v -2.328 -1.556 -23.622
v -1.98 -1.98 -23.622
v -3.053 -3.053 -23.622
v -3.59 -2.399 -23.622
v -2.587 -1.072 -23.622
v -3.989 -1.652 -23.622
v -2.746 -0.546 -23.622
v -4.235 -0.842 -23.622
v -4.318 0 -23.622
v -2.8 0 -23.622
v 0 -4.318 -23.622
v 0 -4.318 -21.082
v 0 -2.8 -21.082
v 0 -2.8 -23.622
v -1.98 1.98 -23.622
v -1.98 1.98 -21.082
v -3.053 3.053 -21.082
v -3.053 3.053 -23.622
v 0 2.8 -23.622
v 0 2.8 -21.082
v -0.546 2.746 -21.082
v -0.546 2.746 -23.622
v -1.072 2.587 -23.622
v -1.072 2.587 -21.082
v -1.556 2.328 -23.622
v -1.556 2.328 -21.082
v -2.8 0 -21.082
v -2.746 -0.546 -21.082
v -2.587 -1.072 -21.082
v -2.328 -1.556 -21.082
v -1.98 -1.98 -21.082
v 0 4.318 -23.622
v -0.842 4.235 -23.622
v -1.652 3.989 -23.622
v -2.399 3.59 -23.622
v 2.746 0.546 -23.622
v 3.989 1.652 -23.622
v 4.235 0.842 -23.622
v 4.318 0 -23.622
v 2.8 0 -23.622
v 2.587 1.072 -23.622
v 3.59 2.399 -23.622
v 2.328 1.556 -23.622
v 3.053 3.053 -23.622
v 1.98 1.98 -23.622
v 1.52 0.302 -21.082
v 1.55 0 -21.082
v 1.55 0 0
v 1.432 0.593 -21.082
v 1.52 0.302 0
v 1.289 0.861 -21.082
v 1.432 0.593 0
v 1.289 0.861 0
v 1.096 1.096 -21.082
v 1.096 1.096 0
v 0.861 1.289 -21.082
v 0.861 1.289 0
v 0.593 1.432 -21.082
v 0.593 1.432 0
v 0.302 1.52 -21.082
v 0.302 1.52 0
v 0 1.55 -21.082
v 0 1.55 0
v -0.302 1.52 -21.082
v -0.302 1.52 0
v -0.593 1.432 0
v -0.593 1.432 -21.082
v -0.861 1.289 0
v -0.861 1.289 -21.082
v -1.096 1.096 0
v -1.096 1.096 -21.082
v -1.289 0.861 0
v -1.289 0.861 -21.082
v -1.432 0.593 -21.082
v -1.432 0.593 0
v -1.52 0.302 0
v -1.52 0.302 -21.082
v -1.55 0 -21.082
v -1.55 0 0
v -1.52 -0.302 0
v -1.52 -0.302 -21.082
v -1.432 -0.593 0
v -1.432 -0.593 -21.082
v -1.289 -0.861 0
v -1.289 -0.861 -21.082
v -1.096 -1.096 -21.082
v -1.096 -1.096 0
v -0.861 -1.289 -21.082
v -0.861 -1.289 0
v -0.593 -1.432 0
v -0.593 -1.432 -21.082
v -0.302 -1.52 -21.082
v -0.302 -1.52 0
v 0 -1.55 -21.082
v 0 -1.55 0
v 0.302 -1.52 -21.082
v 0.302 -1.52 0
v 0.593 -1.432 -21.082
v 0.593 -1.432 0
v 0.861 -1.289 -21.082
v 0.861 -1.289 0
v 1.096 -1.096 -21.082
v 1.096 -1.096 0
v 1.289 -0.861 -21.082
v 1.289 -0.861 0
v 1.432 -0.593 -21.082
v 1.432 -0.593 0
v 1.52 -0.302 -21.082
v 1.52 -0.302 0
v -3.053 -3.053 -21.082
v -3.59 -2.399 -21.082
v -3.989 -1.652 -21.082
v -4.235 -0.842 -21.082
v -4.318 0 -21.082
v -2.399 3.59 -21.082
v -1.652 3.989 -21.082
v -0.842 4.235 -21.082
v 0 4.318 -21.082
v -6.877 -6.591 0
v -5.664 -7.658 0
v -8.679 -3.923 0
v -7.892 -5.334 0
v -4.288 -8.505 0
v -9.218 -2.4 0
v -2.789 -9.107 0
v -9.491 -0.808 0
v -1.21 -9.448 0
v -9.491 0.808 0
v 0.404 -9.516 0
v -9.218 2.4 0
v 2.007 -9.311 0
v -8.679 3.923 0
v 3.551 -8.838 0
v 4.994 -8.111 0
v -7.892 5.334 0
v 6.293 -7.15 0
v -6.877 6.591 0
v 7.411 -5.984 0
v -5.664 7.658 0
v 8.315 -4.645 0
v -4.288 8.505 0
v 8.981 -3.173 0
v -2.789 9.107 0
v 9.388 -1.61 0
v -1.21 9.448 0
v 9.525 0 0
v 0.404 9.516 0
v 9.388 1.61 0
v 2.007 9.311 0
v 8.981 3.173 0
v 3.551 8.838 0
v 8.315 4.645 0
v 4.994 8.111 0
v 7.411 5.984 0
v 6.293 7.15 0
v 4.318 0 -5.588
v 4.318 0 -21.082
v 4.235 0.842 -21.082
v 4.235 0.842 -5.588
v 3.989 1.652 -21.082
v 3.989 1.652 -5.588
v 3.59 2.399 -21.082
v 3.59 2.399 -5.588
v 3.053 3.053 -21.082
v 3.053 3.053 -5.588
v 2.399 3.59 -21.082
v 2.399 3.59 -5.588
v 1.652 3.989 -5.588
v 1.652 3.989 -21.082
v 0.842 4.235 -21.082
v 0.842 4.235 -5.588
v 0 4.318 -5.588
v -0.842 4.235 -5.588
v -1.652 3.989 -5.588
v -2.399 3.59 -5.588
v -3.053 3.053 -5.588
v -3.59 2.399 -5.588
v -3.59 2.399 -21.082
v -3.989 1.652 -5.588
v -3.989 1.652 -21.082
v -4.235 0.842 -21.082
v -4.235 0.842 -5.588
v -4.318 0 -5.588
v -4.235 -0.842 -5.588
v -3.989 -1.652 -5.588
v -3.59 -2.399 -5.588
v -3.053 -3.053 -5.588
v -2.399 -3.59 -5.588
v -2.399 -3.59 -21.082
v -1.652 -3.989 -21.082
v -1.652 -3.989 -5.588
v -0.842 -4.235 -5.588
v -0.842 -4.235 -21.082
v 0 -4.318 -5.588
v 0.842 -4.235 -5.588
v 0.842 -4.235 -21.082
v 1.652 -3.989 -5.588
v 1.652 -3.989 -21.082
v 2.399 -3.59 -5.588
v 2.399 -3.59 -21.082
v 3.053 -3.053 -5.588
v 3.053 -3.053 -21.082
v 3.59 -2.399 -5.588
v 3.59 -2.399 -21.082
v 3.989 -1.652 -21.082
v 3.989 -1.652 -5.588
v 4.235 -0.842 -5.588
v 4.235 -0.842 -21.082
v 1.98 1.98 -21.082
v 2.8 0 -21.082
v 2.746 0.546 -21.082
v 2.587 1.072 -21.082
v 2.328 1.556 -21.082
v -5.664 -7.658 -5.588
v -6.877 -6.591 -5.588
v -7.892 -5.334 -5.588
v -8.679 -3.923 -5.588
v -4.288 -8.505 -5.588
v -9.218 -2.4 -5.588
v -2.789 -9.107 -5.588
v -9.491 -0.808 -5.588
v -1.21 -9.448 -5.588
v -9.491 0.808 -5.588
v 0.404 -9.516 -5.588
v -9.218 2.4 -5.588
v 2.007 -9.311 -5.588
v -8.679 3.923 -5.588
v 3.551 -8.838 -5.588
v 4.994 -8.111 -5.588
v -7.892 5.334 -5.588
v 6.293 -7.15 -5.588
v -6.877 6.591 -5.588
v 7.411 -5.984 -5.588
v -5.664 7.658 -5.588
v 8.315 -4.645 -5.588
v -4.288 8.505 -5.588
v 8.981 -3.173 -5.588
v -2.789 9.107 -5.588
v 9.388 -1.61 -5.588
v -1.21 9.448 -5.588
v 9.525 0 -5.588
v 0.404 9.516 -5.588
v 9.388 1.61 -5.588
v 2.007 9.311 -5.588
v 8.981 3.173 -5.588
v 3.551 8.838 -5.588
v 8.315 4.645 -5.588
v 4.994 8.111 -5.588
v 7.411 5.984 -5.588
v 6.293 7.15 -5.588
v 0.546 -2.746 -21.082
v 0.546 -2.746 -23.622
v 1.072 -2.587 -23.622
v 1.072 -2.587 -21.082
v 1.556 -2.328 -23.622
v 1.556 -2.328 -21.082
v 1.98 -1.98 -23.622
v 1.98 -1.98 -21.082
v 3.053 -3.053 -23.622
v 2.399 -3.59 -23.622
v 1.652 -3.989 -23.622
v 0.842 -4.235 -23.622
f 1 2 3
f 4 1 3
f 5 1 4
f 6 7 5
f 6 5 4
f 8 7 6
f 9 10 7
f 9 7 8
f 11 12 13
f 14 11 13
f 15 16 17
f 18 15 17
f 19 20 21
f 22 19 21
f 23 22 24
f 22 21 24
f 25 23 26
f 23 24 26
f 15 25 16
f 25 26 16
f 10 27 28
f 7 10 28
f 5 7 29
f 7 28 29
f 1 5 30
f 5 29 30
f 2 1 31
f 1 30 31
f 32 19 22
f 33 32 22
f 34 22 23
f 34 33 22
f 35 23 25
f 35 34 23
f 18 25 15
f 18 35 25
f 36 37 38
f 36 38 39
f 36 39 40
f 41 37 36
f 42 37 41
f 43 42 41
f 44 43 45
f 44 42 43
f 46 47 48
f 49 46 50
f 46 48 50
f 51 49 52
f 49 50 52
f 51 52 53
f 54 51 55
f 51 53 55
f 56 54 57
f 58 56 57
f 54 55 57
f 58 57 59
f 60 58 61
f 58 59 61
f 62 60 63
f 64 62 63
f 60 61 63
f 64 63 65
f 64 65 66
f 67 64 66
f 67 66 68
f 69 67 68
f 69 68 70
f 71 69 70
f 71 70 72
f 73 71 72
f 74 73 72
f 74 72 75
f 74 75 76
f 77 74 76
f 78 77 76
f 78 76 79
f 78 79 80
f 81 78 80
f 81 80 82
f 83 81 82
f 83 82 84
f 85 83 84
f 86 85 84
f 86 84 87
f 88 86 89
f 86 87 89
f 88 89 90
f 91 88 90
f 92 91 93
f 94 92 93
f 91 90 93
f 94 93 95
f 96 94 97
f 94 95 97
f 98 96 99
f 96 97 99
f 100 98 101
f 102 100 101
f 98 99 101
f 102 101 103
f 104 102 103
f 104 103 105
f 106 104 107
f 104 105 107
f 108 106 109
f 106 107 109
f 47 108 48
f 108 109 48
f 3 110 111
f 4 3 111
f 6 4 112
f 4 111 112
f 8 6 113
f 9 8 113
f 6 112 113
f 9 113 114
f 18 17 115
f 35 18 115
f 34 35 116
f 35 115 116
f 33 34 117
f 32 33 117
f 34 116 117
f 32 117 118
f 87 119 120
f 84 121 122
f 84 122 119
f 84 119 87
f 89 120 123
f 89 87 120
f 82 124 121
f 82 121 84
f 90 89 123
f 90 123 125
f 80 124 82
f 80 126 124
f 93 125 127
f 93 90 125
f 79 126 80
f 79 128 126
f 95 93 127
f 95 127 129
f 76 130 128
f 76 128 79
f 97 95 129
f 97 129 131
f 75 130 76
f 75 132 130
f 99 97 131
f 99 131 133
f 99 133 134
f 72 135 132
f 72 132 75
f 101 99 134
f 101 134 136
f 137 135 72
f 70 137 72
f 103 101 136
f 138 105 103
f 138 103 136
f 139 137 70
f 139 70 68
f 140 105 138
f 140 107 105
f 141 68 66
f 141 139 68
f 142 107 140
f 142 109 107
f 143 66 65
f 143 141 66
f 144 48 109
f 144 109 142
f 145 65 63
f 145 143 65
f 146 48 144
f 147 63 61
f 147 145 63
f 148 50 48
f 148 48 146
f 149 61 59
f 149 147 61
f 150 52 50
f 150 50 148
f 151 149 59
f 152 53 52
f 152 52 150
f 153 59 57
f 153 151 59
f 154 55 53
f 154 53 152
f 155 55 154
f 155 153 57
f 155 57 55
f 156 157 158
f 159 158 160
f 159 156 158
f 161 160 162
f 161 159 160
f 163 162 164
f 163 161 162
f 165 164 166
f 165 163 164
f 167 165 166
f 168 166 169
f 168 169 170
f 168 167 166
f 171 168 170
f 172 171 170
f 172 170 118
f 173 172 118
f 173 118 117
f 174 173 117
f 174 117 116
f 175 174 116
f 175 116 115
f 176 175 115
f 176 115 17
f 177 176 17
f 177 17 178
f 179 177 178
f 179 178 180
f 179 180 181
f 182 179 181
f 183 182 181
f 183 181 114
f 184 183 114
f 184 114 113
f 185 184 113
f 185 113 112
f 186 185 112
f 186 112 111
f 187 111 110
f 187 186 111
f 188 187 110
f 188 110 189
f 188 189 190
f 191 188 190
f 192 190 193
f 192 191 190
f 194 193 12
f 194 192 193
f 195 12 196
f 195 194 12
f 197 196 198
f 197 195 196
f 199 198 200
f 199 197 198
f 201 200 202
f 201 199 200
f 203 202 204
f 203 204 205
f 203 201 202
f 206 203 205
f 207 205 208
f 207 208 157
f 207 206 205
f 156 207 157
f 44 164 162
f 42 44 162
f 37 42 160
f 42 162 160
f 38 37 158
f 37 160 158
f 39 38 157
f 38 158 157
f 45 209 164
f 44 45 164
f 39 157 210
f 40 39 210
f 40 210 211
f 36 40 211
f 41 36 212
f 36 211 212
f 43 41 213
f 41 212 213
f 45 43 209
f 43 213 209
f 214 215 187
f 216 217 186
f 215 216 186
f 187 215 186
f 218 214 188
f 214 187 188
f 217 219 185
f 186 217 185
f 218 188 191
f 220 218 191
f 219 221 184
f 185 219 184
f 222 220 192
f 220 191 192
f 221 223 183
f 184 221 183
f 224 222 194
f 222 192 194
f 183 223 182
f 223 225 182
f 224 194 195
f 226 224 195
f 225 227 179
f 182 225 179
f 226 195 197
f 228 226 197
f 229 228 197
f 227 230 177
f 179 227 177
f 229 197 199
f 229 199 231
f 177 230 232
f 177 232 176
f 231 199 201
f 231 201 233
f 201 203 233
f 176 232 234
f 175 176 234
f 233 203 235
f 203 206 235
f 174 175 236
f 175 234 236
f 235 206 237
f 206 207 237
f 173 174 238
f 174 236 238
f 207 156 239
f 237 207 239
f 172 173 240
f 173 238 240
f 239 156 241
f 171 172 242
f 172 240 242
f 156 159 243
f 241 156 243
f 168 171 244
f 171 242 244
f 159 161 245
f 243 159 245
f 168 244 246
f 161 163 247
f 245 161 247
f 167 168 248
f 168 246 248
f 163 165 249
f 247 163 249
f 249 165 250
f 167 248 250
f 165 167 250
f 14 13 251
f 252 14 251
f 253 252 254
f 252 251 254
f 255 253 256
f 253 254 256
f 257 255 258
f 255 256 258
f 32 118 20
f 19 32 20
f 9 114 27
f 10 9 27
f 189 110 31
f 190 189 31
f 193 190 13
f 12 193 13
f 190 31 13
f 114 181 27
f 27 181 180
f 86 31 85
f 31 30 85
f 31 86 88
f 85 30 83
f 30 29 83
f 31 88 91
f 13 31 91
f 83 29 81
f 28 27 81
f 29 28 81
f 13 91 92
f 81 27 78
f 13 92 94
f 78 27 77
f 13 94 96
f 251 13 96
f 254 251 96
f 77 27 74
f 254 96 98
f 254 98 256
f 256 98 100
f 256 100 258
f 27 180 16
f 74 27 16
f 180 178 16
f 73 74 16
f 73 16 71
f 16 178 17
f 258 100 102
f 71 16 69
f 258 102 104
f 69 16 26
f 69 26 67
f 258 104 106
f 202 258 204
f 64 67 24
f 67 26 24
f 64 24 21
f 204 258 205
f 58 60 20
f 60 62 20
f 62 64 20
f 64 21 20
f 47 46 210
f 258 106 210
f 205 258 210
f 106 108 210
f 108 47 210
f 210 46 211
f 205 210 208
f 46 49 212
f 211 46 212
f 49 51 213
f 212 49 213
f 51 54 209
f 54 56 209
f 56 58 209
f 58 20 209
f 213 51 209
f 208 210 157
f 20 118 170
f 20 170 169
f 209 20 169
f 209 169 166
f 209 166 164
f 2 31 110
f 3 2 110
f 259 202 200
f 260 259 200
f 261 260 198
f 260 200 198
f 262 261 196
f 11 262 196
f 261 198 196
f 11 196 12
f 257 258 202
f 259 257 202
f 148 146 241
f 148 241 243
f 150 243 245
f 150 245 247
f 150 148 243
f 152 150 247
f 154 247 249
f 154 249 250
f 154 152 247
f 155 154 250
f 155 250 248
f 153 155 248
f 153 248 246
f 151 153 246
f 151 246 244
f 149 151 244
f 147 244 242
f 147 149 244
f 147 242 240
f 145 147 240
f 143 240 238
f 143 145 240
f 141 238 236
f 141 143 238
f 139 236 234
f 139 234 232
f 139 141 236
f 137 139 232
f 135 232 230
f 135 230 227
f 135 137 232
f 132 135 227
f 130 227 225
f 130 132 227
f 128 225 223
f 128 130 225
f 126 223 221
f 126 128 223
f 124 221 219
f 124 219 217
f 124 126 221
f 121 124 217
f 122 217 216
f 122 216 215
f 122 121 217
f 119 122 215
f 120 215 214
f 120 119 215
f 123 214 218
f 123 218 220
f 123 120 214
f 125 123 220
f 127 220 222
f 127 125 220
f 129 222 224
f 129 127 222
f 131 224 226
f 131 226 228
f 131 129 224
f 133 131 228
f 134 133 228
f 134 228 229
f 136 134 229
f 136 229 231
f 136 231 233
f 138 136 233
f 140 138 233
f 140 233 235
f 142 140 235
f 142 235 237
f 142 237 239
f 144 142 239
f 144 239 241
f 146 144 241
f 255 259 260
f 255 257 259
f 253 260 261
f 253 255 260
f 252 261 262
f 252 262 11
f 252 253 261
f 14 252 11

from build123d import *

# Parameters (mm, degrees)
SKETCH1_R           = 4.318
BOSS_EXTRUDE1_DEPTH = 21.082
SKETCH2_R           = 9.525
BOSS_EXTRUDE2_DEPTH = 5.588
BOSS_EXTRUDE3_DEPTH = 2.54
SKETCH6_R           = 1.55
CUT_EXTRUDE1_DEPTH  = 24.622


with BuildPart() as part:
    # Sketch1 → Boss-Extrude1 (new body)
    with BuildSketch(Plane.XY):
        Circle(SKETCH1_R)
    extrude(amount=-BOSS_EXTRUDE1_DEPTH)

    # Sketch2 → Boss-Extrude2 (add)
    with BuildSketch(Plane.XY):
        Circle(SKETCH2_R)
    extrude(amount=-BOSS_EXTRUDE2_DEPTH)

    # Sketch3 → Boss-Extrude3 (add)
    with BuildSketch(Plane(origin=(0, 0, -21.082), x_dir=(-1, 0, 0), z_dir=(0, 0, -1))):
        with BuildLine():
            Line((1.979898987, -1.979898987), (3.053287081, -3.053287081))
            ThreePointArc((3.053287081, -3.053287081), (3.989311821, -1.652427061), (4.318, 0))
            Line((4.318, 0), (2.8, 0))
            ThreePointArc((2.8, 0), (2.586862691, -1.071513611), (1.979898987, -1.979898987))
        make_face()
        with BuildLine():
            ThreePointArc((-3.053287081, 3.053287081), (-3.989311821, 1.652427061), (-4.318, 0))
            Line((-4.318, 0), (-2.8, 0))
            ThreePointArc((-2.8, 0), (-2.586862691, 1.071513611), (-1.979898987, 1.979898987))
            Line((-1.979898987, 1.979898987), (-3.053287081, 3.053287081))
        make_face()
        with BuildLine():
            ThreePointArc((-3.053287081, -3.053287081), (-1.652427061, -3.989311821), (0, -4.318))
            Line((0, -4.318), (0, -2.8))
            ThreePointArc((0, -2.8), (-1.071513611, -2.586862691), (-1.979898987, -1.979898987))
            Line((-1.979898987, -1.979898987), (-3.053287081, -3.053287081))
        make_face()
        with BuildLine():
            Line((0, 4.318), (0, 2.8))
            ThreePointArc((0, 2.8), (1.071513611, 2.586862691), (1.979898987, 1.979898987))
            Line((1.979898987, 1.979898987), (3.053287081, 3.053287081))
            ThreePointArc((3.053287081, 3.053287081), (1.652427061, 3.989311821), (0, 4.318))
        make_face()
    extrude(amount=BOSS_EXTRUDE3_DEPTH)

    # Sketch6 → Cut-Extrude1 (cut, through all)
    with BuildSketch(Plane.XY):
        Circle(SKETCH6_R)
    extrude(amount=-CUT_EXTRUDE1_DEPTH, mode=Mode.SUBTRACT)


solid = part.part
